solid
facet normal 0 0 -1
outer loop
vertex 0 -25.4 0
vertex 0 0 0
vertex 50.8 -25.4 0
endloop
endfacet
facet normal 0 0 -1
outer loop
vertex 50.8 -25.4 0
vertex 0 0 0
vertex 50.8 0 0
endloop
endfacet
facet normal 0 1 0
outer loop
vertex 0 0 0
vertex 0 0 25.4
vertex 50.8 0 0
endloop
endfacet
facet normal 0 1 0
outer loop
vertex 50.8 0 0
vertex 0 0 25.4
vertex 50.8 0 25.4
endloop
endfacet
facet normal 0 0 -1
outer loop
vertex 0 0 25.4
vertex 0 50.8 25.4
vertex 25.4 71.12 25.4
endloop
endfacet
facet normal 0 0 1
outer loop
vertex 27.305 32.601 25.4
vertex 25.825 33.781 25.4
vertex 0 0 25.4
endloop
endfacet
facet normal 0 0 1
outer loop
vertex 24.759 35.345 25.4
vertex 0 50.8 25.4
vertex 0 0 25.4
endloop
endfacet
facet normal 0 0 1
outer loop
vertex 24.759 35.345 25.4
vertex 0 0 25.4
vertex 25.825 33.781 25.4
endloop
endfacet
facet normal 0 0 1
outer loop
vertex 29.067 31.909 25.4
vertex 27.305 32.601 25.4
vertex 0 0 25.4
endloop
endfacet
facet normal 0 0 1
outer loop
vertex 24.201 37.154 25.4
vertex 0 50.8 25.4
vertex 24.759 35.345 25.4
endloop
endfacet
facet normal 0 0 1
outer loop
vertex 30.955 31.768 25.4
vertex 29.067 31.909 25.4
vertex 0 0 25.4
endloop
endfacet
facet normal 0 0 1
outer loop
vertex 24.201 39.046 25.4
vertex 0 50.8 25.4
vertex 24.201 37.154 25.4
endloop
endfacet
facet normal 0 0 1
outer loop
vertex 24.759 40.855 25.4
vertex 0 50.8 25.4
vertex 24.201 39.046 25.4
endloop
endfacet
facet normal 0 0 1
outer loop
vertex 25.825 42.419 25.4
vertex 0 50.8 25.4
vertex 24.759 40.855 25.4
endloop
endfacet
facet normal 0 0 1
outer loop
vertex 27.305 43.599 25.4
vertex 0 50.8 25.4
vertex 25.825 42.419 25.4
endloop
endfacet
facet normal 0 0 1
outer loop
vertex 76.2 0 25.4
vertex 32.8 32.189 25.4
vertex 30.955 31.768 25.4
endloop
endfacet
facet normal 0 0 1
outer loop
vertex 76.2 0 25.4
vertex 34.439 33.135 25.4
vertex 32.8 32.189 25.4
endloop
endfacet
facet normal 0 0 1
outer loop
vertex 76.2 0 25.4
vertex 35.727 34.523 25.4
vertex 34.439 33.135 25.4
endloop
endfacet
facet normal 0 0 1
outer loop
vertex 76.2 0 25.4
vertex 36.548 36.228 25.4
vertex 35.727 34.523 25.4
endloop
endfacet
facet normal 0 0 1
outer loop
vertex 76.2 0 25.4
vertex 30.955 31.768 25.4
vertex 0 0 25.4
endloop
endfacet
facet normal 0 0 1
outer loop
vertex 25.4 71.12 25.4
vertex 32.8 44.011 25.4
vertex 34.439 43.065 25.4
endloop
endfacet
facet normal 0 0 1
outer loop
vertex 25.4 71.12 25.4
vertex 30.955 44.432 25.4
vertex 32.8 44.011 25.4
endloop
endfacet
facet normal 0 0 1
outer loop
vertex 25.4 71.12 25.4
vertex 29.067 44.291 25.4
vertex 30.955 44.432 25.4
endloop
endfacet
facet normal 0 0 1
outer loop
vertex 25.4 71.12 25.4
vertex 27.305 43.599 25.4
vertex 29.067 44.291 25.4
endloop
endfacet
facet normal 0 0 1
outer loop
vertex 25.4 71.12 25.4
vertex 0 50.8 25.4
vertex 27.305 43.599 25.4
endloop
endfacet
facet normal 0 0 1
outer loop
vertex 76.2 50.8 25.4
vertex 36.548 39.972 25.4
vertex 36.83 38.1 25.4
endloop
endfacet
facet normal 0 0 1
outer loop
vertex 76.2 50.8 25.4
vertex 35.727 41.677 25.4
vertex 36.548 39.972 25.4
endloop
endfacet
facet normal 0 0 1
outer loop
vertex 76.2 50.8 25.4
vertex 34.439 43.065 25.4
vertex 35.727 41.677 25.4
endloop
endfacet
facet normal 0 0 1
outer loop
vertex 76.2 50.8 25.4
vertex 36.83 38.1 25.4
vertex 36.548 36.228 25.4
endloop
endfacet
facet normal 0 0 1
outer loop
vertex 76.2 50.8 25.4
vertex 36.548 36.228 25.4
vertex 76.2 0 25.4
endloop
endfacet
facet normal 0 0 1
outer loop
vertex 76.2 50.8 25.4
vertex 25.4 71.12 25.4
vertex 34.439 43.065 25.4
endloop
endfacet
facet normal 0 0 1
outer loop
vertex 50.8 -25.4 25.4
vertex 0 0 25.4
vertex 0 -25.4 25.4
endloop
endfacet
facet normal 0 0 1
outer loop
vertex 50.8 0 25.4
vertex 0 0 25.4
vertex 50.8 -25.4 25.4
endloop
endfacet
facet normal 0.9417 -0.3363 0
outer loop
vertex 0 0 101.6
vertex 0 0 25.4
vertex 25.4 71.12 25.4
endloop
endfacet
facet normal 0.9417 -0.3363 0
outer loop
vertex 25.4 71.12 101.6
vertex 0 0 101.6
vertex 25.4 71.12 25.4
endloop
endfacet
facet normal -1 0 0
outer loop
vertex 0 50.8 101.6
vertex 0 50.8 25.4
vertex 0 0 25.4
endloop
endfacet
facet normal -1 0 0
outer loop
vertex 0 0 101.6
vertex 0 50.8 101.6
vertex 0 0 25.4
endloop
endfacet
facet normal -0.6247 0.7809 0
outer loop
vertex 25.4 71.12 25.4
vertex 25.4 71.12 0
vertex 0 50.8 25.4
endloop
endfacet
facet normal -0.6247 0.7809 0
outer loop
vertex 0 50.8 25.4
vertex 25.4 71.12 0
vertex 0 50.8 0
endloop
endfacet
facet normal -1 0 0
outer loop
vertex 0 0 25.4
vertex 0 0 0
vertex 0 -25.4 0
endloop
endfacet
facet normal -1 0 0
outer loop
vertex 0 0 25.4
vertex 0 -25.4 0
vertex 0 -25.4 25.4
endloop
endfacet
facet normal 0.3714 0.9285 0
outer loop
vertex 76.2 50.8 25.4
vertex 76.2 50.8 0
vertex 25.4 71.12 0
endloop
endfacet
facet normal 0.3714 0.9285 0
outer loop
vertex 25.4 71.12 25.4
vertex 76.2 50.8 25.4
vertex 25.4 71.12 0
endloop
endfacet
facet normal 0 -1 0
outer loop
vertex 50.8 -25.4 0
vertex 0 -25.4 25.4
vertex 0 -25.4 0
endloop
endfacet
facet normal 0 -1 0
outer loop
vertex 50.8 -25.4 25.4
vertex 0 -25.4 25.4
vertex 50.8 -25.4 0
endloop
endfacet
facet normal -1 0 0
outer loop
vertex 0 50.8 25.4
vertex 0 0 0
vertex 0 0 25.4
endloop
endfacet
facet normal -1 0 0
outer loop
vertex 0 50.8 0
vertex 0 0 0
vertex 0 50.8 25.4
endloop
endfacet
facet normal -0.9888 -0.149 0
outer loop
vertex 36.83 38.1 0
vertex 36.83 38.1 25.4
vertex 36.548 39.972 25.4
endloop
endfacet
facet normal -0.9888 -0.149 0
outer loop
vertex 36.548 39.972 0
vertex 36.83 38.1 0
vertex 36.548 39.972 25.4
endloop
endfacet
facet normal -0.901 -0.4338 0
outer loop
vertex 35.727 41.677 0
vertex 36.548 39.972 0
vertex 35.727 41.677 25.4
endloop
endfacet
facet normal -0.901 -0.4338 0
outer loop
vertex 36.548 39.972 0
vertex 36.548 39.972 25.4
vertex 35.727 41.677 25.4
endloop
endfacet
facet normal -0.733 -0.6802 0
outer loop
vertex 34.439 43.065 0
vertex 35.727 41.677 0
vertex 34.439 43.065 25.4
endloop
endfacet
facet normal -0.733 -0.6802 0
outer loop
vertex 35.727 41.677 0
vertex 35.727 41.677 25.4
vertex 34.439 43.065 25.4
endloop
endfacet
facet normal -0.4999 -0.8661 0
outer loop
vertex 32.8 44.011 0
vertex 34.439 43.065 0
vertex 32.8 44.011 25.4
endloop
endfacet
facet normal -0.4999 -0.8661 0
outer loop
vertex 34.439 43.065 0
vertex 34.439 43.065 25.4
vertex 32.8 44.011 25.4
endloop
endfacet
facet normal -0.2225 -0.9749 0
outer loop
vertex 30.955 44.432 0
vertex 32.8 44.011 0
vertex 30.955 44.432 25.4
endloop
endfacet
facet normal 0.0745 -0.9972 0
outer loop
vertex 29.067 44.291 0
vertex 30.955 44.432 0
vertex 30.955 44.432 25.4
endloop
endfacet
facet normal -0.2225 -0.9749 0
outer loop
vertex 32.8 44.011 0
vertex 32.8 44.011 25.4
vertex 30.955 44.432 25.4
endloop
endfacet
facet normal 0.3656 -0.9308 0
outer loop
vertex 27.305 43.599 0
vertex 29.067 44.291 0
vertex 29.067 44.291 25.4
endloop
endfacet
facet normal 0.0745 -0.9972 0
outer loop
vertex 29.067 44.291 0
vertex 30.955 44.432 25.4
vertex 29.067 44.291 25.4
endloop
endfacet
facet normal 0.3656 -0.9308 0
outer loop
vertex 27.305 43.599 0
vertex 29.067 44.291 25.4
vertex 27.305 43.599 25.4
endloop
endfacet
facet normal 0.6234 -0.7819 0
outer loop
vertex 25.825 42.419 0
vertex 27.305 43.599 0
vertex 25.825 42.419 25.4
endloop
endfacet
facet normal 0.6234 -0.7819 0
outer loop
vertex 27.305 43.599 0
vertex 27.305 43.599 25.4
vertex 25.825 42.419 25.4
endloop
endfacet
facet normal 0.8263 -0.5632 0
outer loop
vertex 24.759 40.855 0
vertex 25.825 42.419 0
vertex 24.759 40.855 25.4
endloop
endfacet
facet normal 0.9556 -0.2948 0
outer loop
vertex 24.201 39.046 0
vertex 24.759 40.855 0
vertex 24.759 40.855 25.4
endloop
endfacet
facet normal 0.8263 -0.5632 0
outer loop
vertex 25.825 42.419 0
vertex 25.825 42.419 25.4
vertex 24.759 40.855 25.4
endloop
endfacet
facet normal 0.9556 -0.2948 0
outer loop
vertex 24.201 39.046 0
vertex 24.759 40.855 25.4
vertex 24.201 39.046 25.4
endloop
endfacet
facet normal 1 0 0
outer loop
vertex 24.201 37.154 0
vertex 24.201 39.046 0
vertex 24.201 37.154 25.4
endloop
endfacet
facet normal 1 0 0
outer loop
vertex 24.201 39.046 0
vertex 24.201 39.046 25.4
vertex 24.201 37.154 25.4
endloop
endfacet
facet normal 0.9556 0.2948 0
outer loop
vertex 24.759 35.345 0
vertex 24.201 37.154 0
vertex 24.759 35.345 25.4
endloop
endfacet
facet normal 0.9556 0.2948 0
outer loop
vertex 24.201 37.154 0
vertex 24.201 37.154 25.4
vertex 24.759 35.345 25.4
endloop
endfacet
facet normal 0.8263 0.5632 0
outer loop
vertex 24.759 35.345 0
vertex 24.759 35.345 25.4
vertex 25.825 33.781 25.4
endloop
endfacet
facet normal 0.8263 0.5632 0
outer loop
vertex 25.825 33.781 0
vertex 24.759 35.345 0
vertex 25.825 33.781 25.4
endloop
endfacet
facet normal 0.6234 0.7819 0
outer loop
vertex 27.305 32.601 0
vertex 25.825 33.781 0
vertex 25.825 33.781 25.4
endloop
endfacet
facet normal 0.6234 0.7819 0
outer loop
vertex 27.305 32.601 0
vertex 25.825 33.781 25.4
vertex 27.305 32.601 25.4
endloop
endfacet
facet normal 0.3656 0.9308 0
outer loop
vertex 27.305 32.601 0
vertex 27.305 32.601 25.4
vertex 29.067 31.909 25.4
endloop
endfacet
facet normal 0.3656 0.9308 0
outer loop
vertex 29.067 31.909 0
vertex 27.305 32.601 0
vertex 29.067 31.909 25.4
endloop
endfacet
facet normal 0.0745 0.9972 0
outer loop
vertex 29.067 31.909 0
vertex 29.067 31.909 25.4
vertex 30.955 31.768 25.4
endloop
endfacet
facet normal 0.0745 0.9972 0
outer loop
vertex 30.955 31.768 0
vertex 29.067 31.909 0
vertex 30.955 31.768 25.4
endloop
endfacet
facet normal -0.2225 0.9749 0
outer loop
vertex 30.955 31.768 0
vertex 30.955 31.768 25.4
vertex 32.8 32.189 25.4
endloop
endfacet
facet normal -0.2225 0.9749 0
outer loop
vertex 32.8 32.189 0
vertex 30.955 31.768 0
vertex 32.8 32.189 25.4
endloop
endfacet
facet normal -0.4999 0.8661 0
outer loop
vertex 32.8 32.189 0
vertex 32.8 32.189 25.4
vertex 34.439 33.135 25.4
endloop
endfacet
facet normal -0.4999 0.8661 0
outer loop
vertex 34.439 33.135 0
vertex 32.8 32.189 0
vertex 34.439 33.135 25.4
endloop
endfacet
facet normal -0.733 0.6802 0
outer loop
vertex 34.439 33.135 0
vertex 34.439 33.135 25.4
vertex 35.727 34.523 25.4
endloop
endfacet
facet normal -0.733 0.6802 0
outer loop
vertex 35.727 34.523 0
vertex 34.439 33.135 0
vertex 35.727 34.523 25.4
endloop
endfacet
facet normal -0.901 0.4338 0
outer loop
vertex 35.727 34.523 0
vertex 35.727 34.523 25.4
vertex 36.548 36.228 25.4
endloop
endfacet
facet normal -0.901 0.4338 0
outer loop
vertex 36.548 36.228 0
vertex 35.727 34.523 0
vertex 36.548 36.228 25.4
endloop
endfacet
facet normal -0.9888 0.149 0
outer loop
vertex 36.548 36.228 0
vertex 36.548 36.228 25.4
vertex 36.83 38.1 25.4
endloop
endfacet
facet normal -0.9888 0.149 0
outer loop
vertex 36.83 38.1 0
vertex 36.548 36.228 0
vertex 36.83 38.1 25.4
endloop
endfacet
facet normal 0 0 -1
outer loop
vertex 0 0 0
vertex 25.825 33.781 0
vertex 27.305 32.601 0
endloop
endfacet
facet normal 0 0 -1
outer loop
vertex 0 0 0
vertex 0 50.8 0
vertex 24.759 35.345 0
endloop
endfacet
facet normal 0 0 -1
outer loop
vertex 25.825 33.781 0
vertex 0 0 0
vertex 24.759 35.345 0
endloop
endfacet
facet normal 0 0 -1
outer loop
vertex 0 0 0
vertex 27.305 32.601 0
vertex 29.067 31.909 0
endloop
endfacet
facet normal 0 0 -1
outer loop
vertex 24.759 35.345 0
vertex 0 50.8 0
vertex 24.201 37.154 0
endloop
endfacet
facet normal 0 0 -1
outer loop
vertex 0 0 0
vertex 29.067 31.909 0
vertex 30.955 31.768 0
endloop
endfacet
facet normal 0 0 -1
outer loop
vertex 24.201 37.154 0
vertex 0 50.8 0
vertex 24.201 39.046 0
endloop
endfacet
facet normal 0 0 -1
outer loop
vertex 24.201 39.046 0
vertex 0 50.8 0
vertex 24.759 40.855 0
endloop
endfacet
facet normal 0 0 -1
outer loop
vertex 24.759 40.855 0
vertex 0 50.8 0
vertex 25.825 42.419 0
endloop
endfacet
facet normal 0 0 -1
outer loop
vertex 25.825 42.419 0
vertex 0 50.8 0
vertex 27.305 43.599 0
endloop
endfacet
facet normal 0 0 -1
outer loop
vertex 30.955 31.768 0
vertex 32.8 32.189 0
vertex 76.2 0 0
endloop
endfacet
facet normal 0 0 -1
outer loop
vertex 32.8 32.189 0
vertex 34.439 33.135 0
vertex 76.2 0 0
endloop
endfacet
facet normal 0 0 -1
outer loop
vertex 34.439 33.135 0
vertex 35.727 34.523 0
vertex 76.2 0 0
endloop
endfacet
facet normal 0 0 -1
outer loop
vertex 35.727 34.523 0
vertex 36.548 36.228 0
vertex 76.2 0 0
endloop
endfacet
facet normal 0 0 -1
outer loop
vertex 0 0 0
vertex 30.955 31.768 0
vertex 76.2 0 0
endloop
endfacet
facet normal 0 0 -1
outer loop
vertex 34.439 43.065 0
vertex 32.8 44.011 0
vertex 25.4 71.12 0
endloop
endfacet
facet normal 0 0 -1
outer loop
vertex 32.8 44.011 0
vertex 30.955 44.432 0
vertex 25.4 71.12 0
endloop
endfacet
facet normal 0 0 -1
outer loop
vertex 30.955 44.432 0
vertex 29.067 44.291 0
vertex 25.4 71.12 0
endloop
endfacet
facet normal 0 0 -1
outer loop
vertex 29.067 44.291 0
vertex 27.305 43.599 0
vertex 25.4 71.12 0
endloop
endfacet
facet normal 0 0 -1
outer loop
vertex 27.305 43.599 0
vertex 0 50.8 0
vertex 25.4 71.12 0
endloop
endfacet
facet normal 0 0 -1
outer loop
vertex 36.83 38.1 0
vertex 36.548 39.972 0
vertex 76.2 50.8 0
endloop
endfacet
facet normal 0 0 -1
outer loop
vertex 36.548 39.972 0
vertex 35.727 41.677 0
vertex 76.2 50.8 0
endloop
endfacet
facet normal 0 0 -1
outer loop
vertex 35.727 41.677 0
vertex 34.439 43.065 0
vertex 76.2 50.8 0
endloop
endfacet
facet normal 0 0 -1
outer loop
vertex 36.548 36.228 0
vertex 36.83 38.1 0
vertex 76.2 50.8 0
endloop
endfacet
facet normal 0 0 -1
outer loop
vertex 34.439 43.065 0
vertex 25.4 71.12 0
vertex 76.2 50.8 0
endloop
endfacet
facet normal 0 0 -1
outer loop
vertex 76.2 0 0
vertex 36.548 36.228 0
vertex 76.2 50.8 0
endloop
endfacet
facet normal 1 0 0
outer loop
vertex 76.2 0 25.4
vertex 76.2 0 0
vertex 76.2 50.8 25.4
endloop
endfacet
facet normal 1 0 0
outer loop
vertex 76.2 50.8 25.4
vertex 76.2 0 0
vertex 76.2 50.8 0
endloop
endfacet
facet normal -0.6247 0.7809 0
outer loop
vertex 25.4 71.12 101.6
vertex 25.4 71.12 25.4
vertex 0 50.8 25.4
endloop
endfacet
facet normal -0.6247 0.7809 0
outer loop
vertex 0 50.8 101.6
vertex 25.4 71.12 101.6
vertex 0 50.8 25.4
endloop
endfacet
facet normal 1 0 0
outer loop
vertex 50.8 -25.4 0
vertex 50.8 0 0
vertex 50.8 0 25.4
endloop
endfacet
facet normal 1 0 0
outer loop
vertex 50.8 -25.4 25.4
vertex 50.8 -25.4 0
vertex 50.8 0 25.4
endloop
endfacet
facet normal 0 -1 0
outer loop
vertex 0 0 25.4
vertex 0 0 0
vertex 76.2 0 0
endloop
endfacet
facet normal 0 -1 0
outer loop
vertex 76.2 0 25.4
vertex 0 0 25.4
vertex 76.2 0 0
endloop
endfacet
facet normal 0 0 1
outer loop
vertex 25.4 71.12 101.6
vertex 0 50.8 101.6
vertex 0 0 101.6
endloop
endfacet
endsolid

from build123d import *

# Parameters (mm, degrees)
F0_W     = 76.2
F0_H     = 50.8
F1_DEPTH = 25.4
F2_W     = 50.8
F2_H     = 25.4
F3_DEPTH = 25.4
F5_DEPTH = 76.2
F6_R     = 6.35
F7_DEPTH = 25.401


with BuildPart() as f1:
    # F0 (on Top) → F1 (new body)
    with BuildSketch(Plane.XY):
        with Locations((38.1, 25.4)):
            Rectangle(F0_W, F0_H)
        Polygon((25.4, 71.12), (0, 50.8), (76.2, 50.8), align=None)
    extrude(amount=F1_DEPTH)

    # F6 (on face) → F7 (cut, through all)
    with BuildSketch(Plane.XY.offset(25.4)):
        with Locations((30.48, 38.1)):
            Circle(F6_R)
    extrude(amount=-F7_DEPTH, mode=Mode.SUBTRACT)


with BuildPart() as f3:
    # F2 (on face) → F3 (new body)
    with BuildSketch(Plane.XZ):
        with Locations((25.4, 12.7)):
            Rectangle(F2_W, F2_H)
    extrude(amount=F3_DEPTH)


with BuildPart() as f5:
    # F4 (on face) → F5 (new body)
    with BuildSketch(Plane.XY.offset(25.4)):
        Polygon((0, 50.8), (0, 0), (25.4, 71.12), align=None)
    extrude(amount=F5_DEPTH)


solid = Compound([f1.part, f3.part, f5.part])
